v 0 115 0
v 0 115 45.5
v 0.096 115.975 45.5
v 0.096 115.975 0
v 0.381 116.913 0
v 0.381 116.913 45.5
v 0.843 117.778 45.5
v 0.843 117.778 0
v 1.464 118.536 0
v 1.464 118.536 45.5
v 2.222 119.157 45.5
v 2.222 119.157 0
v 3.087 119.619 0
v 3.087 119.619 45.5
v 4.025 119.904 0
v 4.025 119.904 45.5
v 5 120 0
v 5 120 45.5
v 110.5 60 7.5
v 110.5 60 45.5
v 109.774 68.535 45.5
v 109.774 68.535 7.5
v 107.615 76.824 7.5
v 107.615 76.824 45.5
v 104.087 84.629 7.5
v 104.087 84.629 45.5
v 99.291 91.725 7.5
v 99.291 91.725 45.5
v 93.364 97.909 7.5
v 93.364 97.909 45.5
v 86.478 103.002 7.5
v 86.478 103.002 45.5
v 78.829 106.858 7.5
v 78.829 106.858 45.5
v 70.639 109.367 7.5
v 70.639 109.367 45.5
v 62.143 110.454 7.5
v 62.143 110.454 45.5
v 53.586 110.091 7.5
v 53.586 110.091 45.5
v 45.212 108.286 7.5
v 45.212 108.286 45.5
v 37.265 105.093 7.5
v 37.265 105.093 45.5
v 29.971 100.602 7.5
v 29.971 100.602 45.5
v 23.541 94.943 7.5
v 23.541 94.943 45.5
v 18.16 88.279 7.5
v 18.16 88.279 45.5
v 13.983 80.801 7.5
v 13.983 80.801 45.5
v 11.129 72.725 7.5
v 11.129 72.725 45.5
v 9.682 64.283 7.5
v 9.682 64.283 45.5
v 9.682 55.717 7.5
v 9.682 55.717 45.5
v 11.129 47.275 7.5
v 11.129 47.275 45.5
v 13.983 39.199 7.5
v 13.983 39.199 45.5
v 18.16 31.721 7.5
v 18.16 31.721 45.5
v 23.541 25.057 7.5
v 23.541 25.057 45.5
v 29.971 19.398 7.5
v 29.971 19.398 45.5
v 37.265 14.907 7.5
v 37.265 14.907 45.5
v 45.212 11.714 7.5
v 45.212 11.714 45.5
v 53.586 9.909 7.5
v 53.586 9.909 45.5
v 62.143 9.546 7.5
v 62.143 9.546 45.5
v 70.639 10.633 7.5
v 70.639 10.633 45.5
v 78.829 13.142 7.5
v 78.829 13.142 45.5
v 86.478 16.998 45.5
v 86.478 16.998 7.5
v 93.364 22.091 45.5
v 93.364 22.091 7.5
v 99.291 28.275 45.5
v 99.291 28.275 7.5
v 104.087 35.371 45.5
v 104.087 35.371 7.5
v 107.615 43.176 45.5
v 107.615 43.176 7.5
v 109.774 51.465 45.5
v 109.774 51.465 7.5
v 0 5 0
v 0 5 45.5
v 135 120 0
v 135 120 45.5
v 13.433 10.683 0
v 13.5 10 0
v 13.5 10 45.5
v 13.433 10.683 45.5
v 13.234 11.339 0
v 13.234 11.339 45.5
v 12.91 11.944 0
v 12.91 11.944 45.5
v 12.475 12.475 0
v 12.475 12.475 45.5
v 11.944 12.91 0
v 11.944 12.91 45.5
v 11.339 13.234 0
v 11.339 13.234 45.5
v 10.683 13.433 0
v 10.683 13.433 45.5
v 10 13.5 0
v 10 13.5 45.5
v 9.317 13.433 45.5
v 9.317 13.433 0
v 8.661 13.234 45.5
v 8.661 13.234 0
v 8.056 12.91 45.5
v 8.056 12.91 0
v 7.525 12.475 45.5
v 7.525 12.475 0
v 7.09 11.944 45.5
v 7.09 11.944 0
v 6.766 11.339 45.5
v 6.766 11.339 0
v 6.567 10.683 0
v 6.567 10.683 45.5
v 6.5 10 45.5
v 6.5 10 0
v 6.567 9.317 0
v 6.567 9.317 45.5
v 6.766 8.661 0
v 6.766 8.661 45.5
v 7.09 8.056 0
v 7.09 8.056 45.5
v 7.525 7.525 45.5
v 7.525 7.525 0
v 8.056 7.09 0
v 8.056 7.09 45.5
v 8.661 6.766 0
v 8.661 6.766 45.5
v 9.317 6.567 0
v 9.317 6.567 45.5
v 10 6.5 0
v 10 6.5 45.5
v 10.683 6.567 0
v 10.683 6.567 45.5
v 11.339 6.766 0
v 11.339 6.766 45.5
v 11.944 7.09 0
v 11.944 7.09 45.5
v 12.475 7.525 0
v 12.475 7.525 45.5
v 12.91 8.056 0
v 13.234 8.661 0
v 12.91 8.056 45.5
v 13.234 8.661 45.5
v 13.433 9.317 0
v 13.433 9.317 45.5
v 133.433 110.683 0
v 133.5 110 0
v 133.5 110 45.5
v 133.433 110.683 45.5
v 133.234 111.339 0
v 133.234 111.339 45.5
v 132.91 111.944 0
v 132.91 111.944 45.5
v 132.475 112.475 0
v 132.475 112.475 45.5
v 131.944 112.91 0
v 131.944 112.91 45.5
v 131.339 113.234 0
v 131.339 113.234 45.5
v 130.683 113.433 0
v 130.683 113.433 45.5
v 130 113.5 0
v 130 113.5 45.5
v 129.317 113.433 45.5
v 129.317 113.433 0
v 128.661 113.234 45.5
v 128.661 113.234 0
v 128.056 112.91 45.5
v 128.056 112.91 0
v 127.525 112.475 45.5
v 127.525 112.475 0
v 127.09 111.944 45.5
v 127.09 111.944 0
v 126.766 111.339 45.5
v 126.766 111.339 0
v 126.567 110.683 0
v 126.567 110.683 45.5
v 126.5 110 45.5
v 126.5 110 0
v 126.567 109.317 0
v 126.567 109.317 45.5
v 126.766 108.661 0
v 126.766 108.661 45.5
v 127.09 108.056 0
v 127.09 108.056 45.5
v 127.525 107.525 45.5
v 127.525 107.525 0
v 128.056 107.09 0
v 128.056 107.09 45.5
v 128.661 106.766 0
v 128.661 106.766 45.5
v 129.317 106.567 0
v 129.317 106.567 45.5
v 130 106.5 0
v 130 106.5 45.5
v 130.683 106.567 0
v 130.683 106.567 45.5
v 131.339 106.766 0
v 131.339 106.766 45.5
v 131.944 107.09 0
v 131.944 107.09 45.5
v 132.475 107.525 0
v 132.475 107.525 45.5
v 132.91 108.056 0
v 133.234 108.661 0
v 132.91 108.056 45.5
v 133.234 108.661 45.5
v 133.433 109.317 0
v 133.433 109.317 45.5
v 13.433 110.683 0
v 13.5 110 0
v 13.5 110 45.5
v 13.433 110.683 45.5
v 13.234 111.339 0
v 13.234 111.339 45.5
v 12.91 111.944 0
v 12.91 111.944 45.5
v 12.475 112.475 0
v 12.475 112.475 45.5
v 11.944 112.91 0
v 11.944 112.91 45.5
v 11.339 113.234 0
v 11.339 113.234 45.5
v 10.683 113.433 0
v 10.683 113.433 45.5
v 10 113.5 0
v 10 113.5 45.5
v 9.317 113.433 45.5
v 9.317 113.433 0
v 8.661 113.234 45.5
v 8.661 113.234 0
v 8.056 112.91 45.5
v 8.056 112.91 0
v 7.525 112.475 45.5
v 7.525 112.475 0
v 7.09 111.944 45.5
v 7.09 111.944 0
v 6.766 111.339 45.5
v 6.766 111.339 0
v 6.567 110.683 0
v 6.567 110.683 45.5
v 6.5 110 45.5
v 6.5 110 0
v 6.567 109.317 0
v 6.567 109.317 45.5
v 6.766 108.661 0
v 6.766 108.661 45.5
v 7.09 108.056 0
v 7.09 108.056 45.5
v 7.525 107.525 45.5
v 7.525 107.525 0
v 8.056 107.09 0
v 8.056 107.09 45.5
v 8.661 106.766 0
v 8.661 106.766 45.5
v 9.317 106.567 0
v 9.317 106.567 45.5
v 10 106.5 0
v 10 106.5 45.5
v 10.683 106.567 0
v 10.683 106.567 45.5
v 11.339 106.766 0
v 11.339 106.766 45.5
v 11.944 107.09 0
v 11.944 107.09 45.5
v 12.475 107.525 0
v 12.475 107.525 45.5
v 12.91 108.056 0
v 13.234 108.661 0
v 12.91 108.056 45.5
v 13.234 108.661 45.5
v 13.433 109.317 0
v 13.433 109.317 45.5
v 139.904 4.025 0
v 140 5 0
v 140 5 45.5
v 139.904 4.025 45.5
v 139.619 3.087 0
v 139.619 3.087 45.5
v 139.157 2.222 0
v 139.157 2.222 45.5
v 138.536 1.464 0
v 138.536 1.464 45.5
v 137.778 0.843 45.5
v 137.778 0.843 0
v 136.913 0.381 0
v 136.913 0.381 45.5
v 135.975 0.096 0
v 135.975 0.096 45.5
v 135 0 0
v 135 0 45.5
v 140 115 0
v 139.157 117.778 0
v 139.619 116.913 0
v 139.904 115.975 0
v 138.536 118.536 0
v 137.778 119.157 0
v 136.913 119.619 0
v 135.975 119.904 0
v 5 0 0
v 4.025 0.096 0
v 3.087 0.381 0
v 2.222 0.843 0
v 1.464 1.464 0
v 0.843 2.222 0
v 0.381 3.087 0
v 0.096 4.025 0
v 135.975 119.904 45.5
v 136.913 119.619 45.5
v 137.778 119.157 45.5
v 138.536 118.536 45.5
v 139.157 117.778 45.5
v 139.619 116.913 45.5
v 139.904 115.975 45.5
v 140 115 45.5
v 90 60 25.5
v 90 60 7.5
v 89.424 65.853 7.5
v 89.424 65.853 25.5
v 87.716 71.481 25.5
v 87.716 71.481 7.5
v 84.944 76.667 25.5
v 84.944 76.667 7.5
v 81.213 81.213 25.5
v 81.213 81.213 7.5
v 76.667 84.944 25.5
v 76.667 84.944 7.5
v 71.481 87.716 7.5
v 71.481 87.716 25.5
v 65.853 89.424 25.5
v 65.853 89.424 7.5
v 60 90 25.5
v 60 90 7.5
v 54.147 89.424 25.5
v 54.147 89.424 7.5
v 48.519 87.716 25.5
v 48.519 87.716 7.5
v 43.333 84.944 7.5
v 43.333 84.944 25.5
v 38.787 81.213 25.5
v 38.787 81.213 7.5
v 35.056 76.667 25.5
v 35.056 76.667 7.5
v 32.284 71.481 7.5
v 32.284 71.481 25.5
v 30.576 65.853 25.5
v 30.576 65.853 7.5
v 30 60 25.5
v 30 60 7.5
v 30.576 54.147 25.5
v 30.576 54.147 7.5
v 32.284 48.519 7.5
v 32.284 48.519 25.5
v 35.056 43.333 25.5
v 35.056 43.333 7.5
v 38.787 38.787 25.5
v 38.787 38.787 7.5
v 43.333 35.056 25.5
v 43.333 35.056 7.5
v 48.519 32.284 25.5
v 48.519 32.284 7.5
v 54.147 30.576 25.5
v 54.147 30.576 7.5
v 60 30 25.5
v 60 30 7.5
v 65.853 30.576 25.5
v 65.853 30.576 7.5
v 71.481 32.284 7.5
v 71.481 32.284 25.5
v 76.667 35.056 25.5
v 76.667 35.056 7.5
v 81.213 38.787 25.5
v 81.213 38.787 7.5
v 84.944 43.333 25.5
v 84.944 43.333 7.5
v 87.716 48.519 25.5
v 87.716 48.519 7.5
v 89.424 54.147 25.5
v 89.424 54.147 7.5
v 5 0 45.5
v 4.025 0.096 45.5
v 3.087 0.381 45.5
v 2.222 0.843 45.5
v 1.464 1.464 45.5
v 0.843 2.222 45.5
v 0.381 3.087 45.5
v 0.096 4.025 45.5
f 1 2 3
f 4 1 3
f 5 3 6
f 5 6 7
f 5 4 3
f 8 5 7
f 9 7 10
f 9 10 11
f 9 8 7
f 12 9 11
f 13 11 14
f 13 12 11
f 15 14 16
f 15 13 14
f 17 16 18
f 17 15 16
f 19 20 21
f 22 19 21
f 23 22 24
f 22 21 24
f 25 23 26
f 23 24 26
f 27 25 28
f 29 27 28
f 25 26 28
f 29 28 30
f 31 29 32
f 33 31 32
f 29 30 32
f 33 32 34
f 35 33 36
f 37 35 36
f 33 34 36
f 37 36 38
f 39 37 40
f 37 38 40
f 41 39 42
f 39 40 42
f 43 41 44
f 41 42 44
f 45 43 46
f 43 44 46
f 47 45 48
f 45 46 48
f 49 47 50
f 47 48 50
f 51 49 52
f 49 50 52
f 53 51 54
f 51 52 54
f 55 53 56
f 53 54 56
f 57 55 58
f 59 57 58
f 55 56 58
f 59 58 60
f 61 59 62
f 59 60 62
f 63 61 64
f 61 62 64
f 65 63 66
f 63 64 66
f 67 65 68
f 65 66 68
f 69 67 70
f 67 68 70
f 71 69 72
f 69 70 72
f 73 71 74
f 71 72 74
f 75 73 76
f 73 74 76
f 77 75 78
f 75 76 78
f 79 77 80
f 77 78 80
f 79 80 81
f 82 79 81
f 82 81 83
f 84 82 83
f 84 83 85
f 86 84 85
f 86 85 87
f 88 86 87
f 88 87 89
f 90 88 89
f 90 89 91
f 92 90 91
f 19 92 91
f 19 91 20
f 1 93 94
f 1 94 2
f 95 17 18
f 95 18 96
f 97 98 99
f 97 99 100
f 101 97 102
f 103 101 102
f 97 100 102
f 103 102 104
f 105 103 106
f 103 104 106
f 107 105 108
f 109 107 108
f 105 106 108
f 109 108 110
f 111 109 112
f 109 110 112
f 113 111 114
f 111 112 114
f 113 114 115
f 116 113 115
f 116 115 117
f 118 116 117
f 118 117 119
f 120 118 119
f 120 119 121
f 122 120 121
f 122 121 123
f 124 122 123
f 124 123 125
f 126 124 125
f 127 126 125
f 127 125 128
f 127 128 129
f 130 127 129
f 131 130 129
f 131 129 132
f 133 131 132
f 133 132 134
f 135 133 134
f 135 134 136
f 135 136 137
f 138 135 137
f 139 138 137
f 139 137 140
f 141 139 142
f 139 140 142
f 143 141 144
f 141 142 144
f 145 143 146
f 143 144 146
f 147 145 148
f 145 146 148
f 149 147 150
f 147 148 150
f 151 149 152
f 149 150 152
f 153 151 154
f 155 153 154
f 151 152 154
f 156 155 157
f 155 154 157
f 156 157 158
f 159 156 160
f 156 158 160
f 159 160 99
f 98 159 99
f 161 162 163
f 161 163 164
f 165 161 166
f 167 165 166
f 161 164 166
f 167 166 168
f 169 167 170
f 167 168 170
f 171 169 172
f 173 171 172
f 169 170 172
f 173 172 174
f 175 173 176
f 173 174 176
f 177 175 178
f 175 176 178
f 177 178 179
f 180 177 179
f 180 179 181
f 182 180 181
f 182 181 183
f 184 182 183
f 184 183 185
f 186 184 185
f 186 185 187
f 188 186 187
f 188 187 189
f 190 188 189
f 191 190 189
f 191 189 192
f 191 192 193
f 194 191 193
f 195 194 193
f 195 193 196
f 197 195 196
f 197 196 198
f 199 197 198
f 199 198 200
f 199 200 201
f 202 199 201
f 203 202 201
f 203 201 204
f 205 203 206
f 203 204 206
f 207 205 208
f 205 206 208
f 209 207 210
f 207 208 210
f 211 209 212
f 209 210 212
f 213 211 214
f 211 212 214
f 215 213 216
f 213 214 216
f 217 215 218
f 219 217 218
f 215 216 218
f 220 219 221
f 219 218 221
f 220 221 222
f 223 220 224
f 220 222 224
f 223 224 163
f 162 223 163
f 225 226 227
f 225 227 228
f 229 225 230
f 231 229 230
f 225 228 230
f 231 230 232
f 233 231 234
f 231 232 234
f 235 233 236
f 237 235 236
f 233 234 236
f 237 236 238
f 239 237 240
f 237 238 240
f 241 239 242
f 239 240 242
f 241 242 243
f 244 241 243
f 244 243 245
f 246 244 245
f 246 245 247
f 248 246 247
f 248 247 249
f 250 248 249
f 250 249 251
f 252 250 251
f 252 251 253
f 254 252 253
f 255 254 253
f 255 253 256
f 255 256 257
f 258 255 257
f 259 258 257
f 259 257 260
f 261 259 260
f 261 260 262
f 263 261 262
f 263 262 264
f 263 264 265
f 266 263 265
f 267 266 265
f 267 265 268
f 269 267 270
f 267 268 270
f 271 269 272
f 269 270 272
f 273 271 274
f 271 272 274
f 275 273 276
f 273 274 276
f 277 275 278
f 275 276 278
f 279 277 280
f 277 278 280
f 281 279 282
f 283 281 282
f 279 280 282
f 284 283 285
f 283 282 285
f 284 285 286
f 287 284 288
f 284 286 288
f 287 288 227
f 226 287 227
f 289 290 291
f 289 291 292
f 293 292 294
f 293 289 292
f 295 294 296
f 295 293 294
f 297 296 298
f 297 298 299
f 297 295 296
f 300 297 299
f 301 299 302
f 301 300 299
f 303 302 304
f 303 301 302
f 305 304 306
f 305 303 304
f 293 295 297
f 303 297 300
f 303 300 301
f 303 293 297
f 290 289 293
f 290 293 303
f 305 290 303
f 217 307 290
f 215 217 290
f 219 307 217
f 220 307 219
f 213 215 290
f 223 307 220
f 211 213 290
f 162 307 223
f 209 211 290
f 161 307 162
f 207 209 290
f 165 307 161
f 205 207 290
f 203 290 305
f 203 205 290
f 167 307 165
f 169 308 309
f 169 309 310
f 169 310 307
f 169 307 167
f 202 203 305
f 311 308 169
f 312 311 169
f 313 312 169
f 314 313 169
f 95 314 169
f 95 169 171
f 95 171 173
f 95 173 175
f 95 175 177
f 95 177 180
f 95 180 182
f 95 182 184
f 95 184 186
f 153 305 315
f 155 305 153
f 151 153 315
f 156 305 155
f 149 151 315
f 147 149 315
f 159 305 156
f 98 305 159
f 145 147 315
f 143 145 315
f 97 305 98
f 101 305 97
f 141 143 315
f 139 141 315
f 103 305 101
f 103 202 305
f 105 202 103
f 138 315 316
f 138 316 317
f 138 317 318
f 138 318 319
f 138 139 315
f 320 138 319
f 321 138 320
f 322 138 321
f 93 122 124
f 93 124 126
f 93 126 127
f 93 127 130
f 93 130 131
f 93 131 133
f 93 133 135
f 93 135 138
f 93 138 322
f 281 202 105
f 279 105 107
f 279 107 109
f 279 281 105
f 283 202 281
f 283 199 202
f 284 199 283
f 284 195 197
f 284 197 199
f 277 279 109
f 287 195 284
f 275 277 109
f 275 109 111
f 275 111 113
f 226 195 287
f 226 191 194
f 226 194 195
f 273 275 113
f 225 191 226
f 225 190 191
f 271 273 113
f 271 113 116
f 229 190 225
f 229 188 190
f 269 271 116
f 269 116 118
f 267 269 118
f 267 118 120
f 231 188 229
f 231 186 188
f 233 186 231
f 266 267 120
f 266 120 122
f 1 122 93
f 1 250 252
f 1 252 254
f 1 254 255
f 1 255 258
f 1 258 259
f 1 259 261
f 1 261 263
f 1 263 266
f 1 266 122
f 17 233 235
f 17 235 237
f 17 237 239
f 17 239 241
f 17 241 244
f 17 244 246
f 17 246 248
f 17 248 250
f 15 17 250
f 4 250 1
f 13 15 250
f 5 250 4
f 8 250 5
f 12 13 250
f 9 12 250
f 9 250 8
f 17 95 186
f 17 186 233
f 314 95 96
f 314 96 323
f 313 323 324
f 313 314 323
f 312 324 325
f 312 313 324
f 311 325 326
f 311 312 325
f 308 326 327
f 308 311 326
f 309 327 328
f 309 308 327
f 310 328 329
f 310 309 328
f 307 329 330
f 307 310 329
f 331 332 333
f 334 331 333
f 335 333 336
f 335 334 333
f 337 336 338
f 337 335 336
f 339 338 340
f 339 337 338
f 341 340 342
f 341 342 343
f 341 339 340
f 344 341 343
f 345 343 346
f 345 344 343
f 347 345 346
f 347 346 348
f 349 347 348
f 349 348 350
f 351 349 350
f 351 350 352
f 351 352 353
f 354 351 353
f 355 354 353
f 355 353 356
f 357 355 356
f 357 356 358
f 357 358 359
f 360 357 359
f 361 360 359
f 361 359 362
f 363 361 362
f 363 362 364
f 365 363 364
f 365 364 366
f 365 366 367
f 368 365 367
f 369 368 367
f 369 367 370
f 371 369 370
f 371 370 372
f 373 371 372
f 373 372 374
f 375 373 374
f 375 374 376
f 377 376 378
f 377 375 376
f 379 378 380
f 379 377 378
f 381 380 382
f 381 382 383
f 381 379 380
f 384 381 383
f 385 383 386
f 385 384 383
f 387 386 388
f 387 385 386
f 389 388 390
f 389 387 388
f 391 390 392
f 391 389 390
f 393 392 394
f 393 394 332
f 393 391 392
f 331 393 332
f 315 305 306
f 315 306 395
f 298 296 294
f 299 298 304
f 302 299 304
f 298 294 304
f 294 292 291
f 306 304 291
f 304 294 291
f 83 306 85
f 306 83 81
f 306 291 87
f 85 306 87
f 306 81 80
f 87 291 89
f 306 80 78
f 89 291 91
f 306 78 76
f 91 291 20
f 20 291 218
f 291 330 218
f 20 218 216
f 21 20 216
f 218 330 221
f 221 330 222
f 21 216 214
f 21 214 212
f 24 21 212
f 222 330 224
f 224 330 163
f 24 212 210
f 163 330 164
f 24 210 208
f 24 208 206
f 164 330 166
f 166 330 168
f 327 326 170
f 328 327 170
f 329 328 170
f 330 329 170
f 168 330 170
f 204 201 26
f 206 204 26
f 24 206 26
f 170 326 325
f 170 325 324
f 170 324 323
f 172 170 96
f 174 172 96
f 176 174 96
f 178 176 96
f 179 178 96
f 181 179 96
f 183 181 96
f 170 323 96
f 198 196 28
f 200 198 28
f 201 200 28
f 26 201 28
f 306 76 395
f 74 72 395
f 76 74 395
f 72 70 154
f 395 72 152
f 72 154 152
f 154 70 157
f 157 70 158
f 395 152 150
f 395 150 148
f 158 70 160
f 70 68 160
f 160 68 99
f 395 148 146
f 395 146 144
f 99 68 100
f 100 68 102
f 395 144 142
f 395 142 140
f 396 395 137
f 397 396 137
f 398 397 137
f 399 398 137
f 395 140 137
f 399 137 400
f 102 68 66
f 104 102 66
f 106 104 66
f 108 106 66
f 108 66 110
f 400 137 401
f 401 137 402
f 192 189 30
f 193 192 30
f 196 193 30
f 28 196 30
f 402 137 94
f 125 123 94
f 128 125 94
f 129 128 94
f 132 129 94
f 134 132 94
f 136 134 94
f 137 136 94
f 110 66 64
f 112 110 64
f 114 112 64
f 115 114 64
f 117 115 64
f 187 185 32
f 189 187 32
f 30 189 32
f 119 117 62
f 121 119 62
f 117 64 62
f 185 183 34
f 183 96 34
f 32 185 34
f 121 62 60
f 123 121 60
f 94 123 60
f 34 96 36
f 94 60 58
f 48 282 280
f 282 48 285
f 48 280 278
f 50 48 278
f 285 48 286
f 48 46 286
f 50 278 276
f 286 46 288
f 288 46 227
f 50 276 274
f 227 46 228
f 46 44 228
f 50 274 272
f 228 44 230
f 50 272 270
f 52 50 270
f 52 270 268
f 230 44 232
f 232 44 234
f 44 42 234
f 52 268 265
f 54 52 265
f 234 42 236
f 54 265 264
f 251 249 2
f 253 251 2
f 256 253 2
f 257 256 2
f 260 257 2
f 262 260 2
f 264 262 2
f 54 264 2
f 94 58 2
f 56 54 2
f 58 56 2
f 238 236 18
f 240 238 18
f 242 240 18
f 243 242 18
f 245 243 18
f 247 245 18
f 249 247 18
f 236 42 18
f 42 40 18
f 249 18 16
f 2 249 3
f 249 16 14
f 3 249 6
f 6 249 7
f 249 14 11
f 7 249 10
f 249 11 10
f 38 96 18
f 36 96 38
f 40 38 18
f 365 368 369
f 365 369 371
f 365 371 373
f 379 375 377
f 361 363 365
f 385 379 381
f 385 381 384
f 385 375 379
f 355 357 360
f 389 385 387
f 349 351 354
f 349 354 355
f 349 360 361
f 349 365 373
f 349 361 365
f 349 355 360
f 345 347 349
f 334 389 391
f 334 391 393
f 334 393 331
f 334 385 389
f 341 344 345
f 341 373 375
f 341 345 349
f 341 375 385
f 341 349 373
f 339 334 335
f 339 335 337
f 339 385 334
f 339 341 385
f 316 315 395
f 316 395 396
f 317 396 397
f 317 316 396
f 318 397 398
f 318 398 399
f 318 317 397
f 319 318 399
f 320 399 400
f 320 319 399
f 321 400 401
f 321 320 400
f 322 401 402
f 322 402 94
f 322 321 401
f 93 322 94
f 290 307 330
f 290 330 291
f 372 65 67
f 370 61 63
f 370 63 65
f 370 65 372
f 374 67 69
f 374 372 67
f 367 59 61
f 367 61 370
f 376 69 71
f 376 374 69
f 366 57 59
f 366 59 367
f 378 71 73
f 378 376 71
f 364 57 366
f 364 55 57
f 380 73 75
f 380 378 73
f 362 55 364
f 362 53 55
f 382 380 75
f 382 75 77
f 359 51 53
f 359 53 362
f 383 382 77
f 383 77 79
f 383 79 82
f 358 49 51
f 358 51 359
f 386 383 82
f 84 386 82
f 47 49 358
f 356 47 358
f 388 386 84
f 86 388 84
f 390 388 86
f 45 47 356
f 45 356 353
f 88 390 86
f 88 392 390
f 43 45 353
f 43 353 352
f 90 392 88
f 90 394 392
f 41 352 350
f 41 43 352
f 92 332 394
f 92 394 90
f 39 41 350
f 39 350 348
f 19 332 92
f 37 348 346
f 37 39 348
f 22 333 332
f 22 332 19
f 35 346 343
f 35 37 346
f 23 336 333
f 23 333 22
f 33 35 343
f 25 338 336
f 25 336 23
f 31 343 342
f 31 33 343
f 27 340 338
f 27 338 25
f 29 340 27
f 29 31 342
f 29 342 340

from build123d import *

# Parameters (mm, degrees)
BOSS_EXTRUDE1_DEPTH = 45.5
SKETCH3_R           = 3.5
CUT_EXTRUDE1_DEPTH  = 46.5
SKETCH5_R           = 50.5
SKETCH5_R_2         = 30
CUT_EXTRUDE2_DEPTH  = 38
SKETCH6_R           = 30
CUT_EXTRUDE3_DEPTH  = 20


with BuildPart() as part:
    # Sketch1 → Boss-Extrude1 (new body)
    with BuildSketch(Plane.XY):
        with BuildLine():
            Line((0, 5), (0, 115))
            ThreePointArc((0, 115), (1.464466094, 118.535533906), (5, 120))
            Line((5, 120), (135, 120))
            ThreePointArc((135, 120), (138.535533906, 118.535533906), (140, 115))
            Line((140, 115), (140, 5))
            ThreePointArc((140, 5), (138.535533906, 1.464466094), (135, 0))
            Line((135, 0), (5, 0))
            ThreePointArc((5, 0), (1.464466094, 1.464466094), (0, 5))
        make_face()
    extrude(amount=BOSS_EXTRUDE1_DEPTH)

    # Sketch3 → Cut-Extrude1 (cut, through all)
    with BuildSketch(Plane.XY.offset(45.5)):
        with Locations((10, 110)):
            Circle(SKETCH3_R)
        with Locations((130, 110)):
            Circle(SKETCH3_R)
        with Locations((10, 10)):
            Circle(SKETCH3_R)
    extrude(amount=-CUT_EXTRUDE1_DEPTH, mode=Mode.SUBTRACT)

    # Sketch5 → Cut-Extrude2 (cut)
    with BuildSketch(Plane.XY.offset(45.5)):
        with Locations((60, 60)):
            Circle(SKETCH5_R)
        with Locations((60, 60)):
            Circle(SKETCH5_R_2, mode=Mode.SUBTRACT)
    extrude(amount=-CUT_EXTRUDE2_DEPTH, mode=Mode.SUBTRACT)

    # Sketch6 → Cut-Extrude3 (cut)
    with BuildSketch(Plane.XY.offset(45.5)):
        with Locations((60, 60)):
            Circle(SKETCH6_R)
    extrude(amount=-CUT_EXTRUDE3_DEPTH, mode=Mode.SUBTRACT)


solid = part.part
